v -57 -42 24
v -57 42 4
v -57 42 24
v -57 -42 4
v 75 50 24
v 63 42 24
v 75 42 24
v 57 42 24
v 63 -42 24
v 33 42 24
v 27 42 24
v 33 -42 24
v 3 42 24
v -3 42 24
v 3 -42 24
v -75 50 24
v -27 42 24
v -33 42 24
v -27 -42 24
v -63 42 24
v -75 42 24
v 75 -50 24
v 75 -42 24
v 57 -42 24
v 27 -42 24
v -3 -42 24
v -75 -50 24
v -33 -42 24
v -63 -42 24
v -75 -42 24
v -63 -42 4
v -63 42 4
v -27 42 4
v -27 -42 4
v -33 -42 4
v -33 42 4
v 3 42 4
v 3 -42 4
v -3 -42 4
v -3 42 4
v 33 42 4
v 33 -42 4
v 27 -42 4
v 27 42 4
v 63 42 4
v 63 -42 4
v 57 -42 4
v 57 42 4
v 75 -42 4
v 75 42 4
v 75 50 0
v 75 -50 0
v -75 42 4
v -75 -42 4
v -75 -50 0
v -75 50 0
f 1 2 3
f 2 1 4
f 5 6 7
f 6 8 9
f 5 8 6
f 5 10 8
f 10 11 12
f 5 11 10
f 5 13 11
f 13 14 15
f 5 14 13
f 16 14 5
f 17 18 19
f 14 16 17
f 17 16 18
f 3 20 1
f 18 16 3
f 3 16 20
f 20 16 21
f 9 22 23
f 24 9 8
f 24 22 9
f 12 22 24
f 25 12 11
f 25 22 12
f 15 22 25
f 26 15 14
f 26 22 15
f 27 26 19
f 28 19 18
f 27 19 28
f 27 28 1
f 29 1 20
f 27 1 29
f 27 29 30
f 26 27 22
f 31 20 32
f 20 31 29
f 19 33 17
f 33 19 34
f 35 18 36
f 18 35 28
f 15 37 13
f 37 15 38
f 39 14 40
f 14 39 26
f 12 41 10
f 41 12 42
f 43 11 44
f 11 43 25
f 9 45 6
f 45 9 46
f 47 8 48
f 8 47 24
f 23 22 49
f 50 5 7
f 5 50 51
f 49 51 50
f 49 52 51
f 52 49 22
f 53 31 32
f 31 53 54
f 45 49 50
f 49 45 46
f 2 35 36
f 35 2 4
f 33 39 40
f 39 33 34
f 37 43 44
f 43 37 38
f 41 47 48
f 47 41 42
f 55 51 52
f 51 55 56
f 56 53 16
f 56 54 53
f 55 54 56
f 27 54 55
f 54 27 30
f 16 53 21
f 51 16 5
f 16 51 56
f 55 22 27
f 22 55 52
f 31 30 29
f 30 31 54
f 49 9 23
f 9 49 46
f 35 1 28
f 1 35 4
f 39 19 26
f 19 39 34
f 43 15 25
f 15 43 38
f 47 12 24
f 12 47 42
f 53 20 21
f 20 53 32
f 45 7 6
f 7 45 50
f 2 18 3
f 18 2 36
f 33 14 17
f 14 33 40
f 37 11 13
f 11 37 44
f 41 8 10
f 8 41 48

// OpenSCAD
$fn = 32;

// ----------------------------------------------------------------------
// Rib frame 150 x 100 x 24
// 5 ribs at 30 mm pitch
// ----------------------------------------------------------------------

// --- parameters (mm) ---
frame = [150, 100, 4];  // base plate size (x, y, z)
rail_w = 8;             // side rail width
ribs = 5;               // number of ribs
rib_t = 6;              // rib thickness
rib_h = 20;             // rib height above the base plate
pitch = 30;             // pitch between rib centres

// --- derived feature positions (mm) ---
span = (ribs - 1) * pitch;          // = 120   distance between the outer ribs
origin_x = -span / 2;               // = -60   X of the first rib
rib_len = frame[1] - 2 * rail_w + 2;  // = 86   rib length, 1 mm into each rail
feature_centers = [
  [origin_x + 0 * pitch, 0],
  [origin_x + 1 * pitch, 0],
  [origin_x + 2 * pitch, 0],
  [origin_x + 3 * pitch, 0],
  [origin_x + 4 * pitch, 0]
];   // rib centre line, drives the rib loop

// base plate, two side rails, then the ribs read straight off feature_centers
union() {
  translate([-frame[0] / 2, -frame[1] / 2, 0]) cube(frame);
  translate([-frame[0] / 2, -frame[1] / 2, 0]) cube([frame[0], rail_w, frame[2] + rib_h]);
  translate([-frame[0] / 2, frame[1] / 2 - rail_w, 0]) cube([frame[0], rail_w, frame[2] + rib_h]);
  for (centre = feature_centers)
    translate([centre[0] - rib_t / 2, centre[1] - rib_len / 2, frame[2] - 1])
      cube([rib_t, rib_len, rib_h + 1]);
}
